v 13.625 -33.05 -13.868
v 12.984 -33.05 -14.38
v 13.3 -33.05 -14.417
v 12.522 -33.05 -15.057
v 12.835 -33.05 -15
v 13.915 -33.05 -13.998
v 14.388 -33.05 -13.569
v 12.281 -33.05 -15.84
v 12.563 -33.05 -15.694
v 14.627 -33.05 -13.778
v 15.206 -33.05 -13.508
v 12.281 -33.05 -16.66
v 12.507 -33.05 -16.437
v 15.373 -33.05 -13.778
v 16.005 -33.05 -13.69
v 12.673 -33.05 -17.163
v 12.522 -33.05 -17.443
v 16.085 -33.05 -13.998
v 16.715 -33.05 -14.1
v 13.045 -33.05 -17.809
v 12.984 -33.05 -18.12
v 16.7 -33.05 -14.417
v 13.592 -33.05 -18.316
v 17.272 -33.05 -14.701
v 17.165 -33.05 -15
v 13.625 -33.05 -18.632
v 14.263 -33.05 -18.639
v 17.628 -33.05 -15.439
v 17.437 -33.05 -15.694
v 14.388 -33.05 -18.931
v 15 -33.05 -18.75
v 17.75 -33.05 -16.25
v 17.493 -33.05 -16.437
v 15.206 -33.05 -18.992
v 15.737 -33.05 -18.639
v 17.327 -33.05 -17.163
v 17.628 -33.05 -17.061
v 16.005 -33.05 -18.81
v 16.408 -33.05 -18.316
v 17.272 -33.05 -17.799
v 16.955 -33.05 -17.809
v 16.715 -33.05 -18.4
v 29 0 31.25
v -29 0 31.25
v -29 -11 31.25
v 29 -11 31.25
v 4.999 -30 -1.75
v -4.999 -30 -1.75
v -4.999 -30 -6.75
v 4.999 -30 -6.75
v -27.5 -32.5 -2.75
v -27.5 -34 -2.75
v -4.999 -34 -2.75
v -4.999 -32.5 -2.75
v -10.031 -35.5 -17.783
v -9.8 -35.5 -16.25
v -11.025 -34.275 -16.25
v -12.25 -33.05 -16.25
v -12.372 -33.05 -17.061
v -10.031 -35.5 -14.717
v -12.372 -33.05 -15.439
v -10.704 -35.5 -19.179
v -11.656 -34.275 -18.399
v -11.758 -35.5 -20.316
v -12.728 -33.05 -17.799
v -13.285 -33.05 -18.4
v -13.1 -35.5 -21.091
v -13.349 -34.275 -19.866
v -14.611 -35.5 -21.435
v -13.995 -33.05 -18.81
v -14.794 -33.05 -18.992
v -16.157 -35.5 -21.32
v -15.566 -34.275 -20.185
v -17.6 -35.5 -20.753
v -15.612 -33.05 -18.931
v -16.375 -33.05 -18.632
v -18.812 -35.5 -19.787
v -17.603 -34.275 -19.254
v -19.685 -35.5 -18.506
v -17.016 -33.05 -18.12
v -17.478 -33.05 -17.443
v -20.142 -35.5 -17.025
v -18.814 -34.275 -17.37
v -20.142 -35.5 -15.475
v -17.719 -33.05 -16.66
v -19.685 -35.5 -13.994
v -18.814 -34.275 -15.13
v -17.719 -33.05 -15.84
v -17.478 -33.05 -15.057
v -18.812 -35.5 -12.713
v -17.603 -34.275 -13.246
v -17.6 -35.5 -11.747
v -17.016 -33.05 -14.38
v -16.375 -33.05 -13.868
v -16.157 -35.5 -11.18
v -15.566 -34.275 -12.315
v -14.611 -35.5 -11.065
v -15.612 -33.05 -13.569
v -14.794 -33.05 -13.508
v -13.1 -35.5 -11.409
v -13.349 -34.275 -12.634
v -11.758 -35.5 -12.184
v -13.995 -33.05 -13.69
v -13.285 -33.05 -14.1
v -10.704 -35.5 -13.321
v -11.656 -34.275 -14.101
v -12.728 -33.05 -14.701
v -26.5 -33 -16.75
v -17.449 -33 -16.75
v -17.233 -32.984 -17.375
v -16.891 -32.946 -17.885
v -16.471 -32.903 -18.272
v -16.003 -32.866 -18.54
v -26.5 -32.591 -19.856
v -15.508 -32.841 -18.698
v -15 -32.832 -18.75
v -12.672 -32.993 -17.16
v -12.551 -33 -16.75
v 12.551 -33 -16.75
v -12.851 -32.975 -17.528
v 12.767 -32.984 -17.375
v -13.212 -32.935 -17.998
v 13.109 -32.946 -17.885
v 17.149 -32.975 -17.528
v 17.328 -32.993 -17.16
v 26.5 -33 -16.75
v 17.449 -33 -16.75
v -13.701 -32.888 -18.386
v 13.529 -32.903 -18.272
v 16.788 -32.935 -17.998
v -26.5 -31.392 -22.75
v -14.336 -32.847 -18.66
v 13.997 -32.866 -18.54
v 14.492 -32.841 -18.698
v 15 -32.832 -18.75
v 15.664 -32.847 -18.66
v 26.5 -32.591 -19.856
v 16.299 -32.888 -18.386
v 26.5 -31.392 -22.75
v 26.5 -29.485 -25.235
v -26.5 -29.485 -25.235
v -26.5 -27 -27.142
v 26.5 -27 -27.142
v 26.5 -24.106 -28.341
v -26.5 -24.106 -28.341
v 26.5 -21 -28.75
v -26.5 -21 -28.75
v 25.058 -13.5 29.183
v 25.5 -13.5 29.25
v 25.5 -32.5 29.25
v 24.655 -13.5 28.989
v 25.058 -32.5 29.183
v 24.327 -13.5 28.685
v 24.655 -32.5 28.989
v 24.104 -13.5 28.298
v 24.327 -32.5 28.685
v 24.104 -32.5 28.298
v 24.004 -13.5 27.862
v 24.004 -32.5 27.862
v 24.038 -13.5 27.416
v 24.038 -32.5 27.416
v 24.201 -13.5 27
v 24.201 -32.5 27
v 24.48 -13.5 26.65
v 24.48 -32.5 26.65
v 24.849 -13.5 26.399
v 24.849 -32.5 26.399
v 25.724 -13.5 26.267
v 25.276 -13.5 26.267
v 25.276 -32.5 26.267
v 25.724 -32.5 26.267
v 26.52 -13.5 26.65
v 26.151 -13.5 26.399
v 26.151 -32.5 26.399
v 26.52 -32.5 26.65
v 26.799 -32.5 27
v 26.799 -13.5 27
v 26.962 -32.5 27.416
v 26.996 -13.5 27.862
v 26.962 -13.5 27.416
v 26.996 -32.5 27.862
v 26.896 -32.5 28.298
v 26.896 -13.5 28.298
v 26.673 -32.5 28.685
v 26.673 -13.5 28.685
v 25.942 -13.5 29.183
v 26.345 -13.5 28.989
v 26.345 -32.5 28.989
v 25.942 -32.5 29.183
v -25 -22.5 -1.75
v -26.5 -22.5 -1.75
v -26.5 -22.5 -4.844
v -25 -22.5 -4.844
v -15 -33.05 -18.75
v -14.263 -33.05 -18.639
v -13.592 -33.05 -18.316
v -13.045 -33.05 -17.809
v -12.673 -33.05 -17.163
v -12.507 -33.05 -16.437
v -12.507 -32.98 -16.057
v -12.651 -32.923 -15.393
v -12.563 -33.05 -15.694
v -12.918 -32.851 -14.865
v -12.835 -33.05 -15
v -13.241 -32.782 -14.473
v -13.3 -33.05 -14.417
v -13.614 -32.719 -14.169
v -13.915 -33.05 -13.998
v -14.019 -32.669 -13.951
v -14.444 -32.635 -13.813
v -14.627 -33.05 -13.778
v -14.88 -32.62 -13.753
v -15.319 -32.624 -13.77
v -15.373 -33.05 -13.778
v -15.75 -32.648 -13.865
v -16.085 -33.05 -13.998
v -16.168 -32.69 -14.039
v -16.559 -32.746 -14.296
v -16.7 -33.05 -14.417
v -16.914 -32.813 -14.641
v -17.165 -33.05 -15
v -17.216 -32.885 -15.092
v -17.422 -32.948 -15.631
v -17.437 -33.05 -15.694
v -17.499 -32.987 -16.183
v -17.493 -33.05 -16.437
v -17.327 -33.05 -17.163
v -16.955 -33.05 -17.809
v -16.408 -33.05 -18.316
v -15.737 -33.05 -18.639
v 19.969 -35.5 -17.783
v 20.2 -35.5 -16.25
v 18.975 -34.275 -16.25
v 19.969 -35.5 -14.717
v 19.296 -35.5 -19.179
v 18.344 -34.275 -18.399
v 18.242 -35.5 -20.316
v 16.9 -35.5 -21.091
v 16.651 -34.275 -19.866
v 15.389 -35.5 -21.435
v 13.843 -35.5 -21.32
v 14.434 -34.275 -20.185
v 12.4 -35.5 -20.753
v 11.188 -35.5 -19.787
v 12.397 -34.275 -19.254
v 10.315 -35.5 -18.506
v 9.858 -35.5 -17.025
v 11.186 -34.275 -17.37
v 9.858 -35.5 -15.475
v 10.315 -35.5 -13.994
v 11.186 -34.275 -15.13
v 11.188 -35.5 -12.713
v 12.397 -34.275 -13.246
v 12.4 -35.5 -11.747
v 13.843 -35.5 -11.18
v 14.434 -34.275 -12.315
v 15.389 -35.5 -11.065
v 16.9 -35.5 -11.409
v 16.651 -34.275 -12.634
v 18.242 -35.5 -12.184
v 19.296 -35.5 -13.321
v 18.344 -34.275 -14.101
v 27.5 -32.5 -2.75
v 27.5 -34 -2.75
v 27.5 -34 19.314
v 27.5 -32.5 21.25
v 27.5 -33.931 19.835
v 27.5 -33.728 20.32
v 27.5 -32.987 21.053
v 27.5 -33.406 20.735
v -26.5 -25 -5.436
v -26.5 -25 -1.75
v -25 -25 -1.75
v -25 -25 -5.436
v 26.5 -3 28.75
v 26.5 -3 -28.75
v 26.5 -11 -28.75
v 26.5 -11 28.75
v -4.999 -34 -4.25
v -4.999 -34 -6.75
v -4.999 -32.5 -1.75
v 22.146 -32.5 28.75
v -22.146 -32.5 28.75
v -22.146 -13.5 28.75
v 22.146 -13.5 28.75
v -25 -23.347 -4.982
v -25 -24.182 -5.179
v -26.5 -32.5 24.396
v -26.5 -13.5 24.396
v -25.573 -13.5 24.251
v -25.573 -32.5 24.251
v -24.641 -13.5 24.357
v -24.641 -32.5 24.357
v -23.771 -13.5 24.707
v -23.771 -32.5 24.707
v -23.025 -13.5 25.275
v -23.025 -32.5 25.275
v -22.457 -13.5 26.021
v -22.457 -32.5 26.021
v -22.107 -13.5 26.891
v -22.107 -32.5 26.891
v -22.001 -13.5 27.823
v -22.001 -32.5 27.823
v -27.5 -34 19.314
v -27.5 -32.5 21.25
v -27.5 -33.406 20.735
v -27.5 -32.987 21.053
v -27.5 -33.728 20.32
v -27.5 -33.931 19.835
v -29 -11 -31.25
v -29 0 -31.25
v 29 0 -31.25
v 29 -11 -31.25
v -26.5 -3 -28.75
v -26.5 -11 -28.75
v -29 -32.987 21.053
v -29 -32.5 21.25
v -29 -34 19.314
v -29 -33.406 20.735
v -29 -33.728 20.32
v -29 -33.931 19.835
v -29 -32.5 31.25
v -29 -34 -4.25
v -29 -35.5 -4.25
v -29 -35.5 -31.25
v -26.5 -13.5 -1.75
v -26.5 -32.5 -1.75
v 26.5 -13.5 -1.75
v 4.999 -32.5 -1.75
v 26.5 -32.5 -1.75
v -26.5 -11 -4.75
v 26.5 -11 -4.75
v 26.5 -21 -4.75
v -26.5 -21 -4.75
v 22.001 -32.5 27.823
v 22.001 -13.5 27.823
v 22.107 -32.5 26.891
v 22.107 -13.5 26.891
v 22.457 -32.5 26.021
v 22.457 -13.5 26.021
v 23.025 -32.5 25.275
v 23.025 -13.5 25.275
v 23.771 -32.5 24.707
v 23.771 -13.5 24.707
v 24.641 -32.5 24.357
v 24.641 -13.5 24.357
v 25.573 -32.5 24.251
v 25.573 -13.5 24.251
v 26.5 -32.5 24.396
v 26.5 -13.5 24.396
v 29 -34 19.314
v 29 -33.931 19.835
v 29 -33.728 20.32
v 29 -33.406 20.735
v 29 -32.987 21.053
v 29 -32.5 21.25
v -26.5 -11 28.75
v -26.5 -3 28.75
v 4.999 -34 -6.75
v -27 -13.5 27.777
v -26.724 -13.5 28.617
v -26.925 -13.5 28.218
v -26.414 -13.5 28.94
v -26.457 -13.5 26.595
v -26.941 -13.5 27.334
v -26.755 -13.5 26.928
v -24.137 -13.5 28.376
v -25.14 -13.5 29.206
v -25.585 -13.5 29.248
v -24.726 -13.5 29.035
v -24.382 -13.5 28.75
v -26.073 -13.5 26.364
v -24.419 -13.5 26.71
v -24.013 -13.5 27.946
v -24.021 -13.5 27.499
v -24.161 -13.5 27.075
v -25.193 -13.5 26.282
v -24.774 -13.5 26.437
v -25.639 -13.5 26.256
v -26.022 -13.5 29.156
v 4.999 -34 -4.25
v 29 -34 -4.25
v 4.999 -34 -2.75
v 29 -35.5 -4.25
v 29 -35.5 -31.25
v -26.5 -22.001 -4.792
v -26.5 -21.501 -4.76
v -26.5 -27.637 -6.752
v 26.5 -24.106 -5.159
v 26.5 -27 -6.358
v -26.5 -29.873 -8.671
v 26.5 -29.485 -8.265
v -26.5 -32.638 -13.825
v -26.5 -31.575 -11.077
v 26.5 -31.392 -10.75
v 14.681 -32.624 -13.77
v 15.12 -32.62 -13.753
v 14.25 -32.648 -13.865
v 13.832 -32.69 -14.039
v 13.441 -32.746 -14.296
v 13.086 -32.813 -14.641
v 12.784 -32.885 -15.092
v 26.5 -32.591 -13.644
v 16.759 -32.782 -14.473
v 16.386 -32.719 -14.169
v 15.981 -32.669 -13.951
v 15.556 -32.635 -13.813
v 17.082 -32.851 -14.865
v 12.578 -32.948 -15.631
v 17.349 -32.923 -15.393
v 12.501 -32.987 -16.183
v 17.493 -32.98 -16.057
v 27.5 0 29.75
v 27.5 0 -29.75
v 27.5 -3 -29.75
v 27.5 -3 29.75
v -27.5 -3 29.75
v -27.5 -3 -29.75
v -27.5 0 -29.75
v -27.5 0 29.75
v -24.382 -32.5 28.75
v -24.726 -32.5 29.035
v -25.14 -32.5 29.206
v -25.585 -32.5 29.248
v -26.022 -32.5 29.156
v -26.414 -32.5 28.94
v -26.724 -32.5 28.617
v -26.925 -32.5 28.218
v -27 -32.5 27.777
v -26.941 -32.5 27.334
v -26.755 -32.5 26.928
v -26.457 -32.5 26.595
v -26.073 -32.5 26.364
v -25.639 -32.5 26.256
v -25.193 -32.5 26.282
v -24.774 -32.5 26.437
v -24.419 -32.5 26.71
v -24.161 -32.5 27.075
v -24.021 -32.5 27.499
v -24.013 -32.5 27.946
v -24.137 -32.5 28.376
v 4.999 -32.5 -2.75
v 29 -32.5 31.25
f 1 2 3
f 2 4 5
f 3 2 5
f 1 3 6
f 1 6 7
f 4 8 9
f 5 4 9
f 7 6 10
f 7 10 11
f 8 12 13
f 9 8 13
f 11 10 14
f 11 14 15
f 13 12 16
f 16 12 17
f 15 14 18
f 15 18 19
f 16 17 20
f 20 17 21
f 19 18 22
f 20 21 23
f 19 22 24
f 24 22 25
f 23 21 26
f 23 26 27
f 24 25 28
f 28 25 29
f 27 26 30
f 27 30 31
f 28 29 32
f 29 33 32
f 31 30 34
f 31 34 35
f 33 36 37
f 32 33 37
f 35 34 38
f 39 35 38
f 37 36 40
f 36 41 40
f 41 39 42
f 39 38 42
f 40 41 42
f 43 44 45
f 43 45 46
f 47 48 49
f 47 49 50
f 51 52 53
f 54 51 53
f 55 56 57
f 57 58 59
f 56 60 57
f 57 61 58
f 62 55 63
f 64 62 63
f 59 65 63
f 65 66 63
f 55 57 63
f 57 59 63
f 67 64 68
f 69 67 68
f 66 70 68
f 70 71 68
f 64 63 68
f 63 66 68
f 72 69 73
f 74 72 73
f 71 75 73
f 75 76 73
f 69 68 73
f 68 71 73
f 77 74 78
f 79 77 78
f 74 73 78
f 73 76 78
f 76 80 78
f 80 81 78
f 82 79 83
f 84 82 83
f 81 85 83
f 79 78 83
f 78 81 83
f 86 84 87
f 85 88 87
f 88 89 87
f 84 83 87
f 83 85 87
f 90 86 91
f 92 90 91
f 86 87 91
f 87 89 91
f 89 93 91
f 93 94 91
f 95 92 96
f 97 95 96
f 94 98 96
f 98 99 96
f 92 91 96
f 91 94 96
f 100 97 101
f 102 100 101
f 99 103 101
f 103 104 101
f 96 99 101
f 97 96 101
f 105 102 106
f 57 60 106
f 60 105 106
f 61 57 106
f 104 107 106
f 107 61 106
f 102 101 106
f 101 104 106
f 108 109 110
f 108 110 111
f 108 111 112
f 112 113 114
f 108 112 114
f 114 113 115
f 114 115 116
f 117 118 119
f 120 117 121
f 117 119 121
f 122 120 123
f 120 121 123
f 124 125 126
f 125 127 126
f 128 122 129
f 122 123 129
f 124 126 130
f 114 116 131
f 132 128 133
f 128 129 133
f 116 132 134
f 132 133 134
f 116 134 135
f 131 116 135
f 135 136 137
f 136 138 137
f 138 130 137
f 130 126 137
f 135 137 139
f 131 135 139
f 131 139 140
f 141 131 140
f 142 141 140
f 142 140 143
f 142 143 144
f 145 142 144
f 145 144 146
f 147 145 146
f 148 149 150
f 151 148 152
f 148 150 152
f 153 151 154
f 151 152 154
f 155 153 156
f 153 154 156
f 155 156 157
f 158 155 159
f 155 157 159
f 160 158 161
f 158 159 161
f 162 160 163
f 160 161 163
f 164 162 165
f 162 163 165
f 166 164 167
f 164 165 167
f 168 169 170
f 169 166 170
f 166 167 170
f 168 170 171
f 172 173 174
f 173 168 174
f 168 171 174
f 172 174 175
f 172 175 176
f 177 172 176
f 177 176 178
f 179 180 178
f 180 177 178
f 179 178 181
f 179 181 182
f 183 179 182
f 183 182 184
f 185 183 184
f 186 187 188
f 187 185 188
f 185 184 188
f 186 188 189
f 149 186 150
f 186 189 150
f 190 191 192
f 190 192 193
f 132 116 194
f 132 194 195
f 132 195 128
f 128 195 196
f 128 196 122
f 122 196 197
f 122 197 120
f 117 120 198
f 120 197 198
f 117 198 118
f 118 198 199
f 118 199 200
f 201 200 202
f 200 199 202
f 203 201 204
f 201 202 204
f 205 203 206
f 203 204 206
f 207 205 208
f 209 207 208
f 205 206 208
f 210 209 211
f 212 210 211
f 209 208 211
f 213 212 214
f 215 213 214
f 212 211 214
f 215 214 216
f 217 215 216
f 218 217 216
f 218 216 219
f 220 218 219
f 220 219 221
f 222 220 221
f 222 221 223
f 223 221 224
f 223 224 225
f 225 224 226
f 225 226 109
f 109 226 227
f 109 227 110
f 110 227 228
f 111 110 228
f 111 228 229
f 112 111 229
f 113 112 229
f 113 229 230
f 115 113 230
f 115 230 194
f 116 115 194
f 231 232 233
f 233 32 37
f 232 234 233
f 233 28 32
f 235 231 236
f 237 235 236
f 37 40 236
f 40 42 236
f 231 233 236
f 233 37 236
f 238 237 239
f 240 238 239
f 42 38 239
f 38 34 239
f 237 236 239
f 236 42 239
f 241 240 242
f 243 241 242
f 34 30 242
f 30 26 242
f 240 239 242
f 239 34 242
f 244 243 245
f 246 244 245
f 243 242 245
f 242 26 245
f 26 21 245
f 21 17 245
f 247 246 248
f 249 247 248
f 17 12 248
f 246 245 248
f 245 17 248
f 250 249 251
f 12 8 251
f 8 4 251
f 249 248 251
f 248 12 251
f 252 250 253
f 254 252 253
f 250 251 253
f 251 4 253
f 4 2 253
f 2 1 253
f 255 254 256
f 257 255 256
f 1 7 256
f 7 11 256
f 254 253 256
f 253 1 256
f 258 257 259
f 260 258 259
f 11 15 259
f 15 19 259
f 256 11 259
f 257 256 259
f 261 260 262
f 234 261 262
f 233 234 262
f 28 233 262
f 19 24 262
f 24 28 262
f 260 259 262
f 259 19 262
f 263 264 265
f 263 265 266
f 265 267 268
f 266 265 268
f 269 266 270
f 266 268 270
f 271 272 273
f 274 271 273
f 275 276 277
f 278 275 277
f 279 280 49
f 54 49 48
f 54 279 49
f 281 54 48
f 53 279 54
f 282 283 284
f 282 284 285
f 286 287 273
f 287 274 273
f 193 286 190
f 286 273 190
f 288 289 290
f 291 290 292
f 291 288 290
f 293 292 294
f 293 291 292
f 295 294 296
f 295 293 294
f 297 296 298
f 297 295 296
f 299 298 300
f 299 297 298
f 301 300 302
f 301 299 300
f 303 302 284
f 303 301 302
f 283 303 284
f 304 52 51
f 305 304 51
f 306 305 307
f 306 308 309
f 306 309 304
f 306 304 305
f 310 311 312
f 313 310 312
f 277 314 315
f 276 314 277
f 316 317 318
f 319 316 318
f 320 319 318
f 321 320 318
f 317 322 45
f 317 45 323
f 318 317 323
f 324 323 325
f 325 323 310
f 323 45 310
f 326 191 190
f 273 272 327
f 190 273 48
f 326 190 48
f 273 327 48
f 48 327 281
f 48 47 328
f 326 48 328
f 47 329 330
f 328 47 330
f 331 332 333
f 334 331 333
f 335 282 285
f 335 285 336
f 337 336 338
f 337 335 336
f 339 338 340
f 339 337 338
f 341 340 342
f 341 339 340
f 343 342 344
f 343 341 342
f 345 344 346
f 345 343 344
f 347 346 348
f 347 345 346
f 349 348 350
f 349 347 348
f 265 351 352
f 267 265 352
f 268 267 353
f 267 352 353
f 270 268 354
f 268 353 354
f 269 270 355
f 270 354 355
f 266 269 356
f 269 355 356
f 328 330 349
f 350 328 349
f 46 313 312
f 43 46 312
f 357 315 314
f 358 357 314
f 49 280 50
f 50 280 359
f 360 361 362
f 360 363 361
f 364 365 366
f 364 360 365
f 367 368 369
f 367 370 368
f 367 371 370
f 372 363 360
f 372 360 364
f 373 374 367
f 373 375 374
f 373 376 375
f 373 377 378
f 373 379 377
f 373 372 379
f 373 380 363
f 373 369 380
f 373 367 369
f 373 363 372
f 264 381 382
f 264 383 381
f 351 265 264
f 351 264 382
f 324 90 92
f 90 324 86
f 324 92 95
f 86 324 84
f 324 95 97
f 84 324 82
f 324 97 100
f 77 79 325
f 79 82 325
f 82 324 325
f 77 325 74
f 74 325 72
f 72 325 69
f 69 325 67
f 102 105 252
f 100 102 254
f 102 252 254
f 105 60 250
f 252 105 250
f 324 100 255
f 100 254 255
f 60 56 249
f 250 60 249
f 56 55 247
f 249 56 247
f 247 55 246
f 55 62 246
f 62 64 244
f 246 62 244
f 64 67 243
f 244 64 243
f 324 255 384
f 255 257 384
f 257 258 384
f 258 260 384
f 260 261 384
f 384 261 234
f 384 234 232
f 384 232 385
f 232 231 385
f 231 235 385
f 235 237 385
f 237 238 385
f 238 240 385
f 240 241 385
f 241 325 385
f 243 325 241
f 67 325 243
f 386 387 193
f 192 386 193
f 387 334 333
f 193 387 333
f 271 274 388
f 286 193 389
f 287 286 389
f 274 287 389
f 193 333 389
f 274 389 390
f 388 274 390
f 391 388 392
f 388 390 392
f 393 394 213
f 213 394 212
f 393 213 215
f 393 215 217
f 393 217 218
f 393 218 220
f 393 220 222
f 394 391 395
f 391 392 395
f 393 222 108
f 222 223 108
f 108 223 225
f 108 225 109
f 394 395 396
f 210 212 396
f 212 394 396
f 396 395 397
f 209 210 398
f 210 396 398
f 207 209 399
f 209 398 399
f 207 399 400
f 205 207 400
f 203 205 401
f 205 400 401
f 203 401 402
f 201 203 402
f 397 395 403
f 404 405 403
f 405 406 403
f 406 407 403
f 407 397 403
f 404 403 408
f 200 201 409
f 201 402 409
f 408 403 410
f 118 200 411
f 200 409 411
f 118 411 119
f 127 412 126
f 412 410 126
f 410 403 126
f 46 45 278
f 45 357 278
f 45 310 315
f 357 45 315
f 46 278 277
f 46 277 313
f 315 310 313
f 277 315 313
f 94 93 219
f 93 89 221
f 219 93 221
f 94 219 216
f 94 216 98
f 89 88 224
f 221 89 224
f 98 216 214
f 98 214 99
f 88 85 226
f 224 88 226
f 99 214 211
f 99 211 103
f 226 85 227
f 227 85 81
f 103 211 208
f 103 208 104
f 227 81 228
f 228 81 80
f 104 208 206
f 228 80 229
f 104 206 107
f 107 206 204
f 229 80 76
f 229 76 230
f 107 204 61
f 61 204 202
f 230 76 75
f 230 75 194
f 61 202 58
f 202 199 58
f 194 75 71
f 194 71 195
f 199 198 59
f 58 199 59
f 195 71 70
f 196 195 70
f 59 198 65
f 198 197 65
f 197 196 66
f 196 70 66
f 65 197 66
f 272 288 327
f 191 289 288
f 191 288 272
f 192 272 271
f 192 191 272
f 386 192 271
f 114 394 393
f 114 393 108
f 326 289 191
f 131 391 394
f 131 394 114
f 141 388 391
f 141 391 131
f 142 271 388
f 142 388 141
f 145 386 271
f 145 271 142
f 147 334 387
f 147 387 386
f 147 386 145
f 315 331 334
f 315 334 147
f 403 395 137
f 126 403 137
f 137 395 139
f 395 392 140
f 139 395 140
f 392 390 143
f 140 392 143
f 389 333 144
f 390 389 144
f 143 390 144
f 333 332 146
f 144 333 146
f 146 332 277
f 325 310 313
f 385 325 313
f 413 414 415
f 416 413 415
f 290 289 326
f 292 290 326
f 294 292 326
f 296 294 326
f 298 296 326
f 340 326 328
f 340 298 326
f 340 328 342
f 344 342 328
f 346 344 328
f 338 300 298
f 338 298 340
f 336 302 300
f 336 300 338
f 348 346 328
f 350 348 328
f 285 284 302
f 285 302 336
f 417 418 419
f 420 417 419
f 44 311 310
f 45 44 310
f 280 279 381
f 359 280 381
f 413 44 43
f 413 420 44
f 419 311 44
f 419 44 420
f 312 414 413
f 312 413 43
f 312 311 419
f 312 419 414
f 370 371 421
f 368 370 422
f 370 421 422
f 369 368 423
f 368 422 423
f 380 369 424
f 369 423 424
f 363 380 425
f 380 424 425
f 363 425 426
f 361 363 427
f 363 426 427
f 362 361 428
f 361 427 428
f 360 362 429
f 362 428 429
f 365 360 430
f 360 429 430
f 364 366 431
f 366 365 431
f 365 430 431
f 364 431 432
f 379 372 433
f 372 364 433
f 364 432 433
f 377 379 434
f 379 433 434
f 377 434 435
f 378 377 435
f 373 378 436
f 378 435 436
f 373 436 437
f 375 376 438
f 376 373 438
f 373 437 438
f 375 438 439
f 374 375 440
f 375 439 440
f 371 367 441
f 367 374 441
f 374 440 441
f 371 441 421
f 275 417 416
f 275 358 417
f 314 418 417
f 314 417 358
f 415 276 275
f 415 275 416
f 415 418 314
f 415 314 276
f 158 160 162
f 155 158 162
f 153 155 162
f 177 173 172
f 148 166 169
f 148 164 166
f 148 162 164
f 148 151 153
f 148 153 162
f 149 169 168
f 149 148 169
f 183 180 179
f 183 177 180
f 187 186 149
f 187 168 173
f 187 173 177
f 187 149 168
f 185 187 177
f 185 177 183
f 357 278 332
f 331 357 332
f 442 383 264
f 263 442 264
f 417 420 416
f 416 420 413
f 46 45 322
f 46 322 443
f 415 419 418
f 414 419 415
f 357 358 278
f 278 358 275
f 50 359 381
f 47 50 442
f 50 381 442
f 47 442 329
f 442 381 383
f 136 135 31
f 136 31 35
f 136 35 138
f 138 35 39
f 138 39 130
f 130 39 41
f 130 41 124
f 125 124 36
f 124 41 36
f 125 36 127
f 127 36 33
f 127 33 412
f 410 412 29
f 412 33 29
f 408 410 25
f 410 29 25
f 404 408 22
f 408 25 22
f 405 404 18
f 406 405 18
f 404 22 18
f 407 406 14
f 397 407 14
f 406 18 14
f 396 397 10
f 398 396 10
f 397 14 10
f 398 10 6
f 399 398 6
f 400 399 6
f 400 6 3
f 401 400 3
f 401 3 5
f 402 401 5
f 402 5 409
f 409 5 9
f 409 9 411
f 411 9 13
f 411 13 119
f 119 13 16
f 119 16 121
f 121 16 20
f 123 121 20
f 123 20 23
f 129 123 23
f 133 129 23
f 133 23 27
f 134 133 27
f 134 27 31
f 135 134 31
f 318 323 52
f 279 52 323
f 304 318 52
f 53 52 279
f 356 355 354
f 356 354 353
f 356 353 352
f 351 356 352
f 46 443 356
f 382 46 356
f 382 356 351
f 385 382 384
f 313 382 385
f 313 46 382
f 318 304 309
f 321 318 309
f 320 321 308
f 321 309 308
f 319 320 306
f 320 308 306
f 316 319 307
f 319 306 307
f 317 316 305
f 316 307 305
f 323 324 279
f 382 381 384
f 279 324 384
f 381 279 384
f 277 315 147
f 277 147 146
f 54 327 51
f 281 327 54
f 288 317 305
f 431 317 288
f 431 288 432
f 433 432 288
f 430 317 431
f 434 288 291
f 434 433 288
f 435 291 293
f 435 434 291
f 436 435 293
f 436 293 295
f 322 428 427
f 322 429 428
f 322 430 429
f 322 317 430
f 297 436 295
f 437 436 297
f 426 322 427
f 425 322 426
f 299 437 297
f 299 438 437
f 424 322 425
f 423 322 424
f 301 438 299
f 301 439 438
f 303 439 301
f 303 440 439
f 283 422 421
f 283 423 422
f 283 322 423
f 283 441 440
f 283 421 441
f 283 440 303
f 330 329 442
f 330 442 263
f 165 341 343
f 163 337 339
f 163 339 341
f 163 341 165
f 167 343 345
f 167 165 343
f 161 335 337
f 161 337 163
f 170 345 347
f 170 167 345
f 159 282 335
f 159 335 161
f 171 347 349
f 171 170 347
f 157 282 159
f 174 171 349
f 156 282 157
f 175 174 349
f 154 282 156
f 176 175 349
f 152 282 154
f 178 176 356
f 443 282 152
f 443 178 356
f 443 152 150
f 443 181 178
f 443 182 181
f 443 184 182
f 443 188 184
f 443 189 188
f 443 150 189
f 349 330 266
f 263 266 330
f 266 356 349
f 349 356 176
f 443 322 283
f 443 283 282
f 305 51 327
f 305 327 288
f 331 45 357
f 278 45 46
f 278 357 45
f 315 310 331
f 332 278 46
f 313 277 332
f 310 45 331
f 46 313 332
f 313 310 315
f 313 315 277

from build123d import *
from build123d.topology import SkipClean

# Parameters (mm, degrees)
SKETCH1_W                 = 58
SKETCH1_H                 = 62.5
BOSS_EXTRUDE1_DEPTH       = 35.5
SKETCH2_W                 = 55
SKETCH2_H                 = 59.5
CUT_EXTRUDE1_DEPTH        = 3
SKETCH3_W                 = 53
SKETCH3_H                 = 57.5
CUT_EXTRUDE2_DEPTH        = 8
SKETCH4_W                 = 53
SKETCH4_H                 = 24.5
CUT_EXTRUDE3_DEPTH        = 22
SKETCH5_W                 = 53
SKETCH5_H                 = 30.5
CUT_EXTRUDE4_DEPTH        = 22
BOSS_EXTRUDE2_REACH       = 57.478
SKETCH6_R                 = 3.5
SKETCH6_R_2               = 1.5
SKETCH6_2_R               = 1.5
CUT_EXTRUDE5_DEPTH        = 22
BOSS_EXTRUDE4_DEPTH       = 53
SKETCH8_W                 = 58
SKETCH8_H                 = 35.5
CUT_EXTRUDE6_DEPTH        = 1.5
SKETCH10_W                = 9.998360964
SKETCH10_H                = 5
CUT_EXTRUDE8_DEPTH        = 4
CUT_EXTRUDE7_REACH        = 58.482
CUT_EXTRUDE7_END_RADIUS   = 12
SKETCH9_W                 = 1.5
SKETCH9_H                 = 2.5
SKETCH11_W                = 55
SKETCH11_H                = 32.5
CUT_EXTRUDE9_DEPTH        = 1.5
SKETCH12_W                = 58
SKETCH12_H                = 10
CUT_EXTRUDE10_DEPTH       = 1.5
FILLET2_R                 = 2
ADVANCEDHOLE1_OUTLINE_R   = 2.75
ADVANCEDHOLE1_DEPTH       = 2.45
ADVANCEDHOLE1_DRAFT       = 45
ADVANCEDHOLE1_2_OUTLINE_R = 2.75
ADVANCEDHOLE1_2_DEPTH     = 2.45
ADVANCEDHOLE1_2_DRAFT     = 45
SKETCH13_R                = 2.5
CUT_EXTRUDE11_DEPTH       = 56.478036195
SPLIT1_START              = -31.25
SPLIT1_OUTLINE_W          = 58
SPLIT1_OUTLINE_H          = 11
SPLIT1_DEPTH              = 62.5
SPLIT1_2_DEPTH            = 62.5
SPLIT1_3_OUTLINE_W        = 53
SPLIT1_3_OUTLINE_H        = 8
SPLIT1_3_DEPTH            = 2.5
SPLIT1_START_2            = 28.75
SPLIT1_4_OUTLINE_W        = 53
SPLIT1_4_OUTLINE_H        = 8
SPLIT1_4_DEPTH            = 2.5
SPLIT1_5_OUTLINE_W        = 55
SPLIT1_5_OUTLINE_H        = 3
SPLIT1_5_DEPTH            = 1.5
SPLIT1_START_3            = 29.75
SPLIT1_6_OUTLINE_W        = 55
SPLIT1_6_OUTLINE_H        = 3
SPLIT1_6_DEPTH            = 1.5


# Read off the part's stored shape, not the designer's step: AdvancedHole1, Split1
with BuildPart() as part:
    # Sketch1 → Boss-Extrude1 (new body)
    with BuildSketch(Plane(origin=(0, 0, 0), x_dir=(1, 0, 0), z_dir=(0, 1, 0))):
        Rectangle(SKETCH1_W, SKETCH1_H)
    extrude(amount=-BOSS_EXTRUDE1_DEPTH)

    # Sketch2 → Cut-Extrude1 (cut)
    with BuildSketch(Plane(origin=(0, 0, 0), x_dir=(1, 0, 0), z_dir=(0, 1, 0))):
        Rectangle(SKETCH2_W, SKETCH2_H)
    extrude(amount=-CUT_EXTRUDE1_DEPTH, mode=Mode.SUBTRACT)

    # Sketch3 → Cut-Extrude2 (cut)
    with BuildSketch(Plane(origin=(0, -3, 0), x_dir=(1, 0, 0), z_dir=(0, 1, 0))):
        Rectangle(SKETCH3_W, SKETCH3_H)
    extrude(amount=-CUT_EXTRUDE2_DEPTH, mode=Mode.SUBTRACT)

    # Sketch4 → Cut-Extrude3 (cut)
    with BuildSketch(Plane(origin=(0, -11, 0), x_dir=(1, 0, 0), z_dir=(0, 1, 0))):
        with Locations((0, 16.5)):
            Rectangle(SKETCH4_W, SKETCH4_H)
    extrude(amount=-CUT_EXTRUDE3_DEPTH, mode=Mode.SUBTRACT)

    # Sketch5 → Cut-Extrude4 (cut)
    with BuildSketch(Plane.XZ.offset(35.5)):
        with Locations((0, 13.5)):
            Rectangle(SKETCH5_W, SKETCH5_H)
    extrude(amount=-CUT_EXTRUDE4_DEPTH, mode=Mode.SUBTRACT)

    # Sketch6 → Boss-Extrude2 (add, up to next)
    with BuildSketch(Plane.XZ.offset(35.5), mode=Mode.PRIVATE) as boss_extrude2_sk1:
        with Locations((-25.5, 27.75)):
            Circle(SKETCH6_R)
        with Locations((-25.5, 27.75)):
            Circle(SKETCH6_R_2, mode=Mode.SUBTRACT)
    boss_extrude2_tool1 = extrude(boss_extrude2_sk1.sketch, amount=-BOSS_EXTRUDE2_REACH, mode=Mode.PRIVATE) - part.part
    # Sketch6 → Boss-Extrude2 (add, up to next)
    with BuildSketch(Plane.XZ.offset(35.5), mode=Mode.PRIVATE) as boss_extrude2_sk2:
        with Locations((25.5, 27.75)):
            Circle(SKETCH6_R)
        with Locations((25.5, 27.75)):
            Circle(SKETCH6_R_2, mode=Mode.SUBTRACT)
    boss_extrude2_tool2 = extrude(boss_extrude2_sk2.sketch, amount=-BOSS_EXTRUDE2_REACH, mode=Mode.PRIVATE) - part.part
    add(boss_extrude2_tool1.solids().sort_by_distance((-28.901005, -35.5, 27.75))[0])
    add(boss_extrude2_tool2.solids().sort_by_distance((22.098995, -35.5, 27.75))[0])

    # Sketch6<2> → Cut-Extrude5 (cut)
    with BuildSketch(Plane.XZ.offset(35.5)):
        with Locations(Location((-25.5, 27.75, 0), (0, 0, 270))):
            Circle(SKETCH6_2_R)
        with Locations(Location((25.5, 27.75, 0), (0, 0, 90))):
            Circle(SKETCH6_2_R)
    extrude(amount=-CUT_EXTRUDE5_DEPTH, mode=Mode.SUBTRACT)

    # Sketch7 → Boss-Extrude4 (add)
    with BuildSketch(Plane.ZY.offset(-26.5)):
        with BuildLine():
            Line((-16.75, -33), (-4.25, -33))
            Line((-4.25, -33), (-4.25, -11))
            Line((-4.25, -11), (-4.75, -11))
            Line((-4.75, -11), (-4.75, -21))
            ThreePointArc((-4.75, -21), (-8.264718626, -29.485281374), (-16.75, -33))
        make_face()
        with BuildLine():
            Line((-28.75, -33), (-16.75, -33))
            ThreePointArc((-16.75, -33), (-25.235281374, -29.485281374), (-28.75, -21))
            Line((-28.75, -21), (-28.75, -33))
        make_face()
    extrude(amount=BOSS_EXTRUDE4_DEPTH)

    # Sketch8 → Cut-Extrude6 (cut)
    with BuildSketch(Plane.XZ.offset(35.5)):
        with Locations((0, 13.5)):
            Rectangle(SKETCH8_W, SKETCH8_H)
    extrude(amount=-CUT_EXTRUDE6_DEPTH, mode=Mode.SUBTRACT)

    # Sketch10 → Cut-Extrude8 (cut)
    with BuildSketch(Plane.XZ.offset(34)):
        with Locations((0, -4.25)):
            Rectangle(SKETCH10_W, SKETCH10_H)
    extrude(amount=-CUT_EXTRUDE8_DEPTH, mode=Mode.SUBTRACT)

    # Cut-Extrude7: up to this cylinder (the profile starts outside it)
    cut_extrude7_end = Plane(origin=(-25.75, -21, -16.75), z_dir=(1, 0, 0)) * Cylinder(CUT_EXTRUDE7_END_RADIUS, 141.964, mode=Mode.PRIVATE)
    # Sketch9 → Cut-Extrude7 (cut, up to the surface)
    with BuildSketch(Plane.XY.offset(-1.75), mode=Mode.PRIVATE) as cut_extrude7_sk1:
        with Locations((-25.75, -23.75)):
            Rectangle(SKETCH9_W, SKETCH9_H)
    cut_extrude7_tool1 = extrude(cut_extrude7_sk1.sketch, amount=-CUT_EXTRUDE7_REACH, mode=Mode.PRIVATE) - cut_extrude7_end
    add(cut_extrude7_tool1.solids().sort_by_distance((-25.75, -23.75, -1.75))[0], mode=Mode.SUBTRACT)

    # Sketch11 → Cut-Extrude9 (cut)
    with BuildSketch(Plane.XZ.offset(34)):
        with Locations((0, 13.5)):
            Rectangle(SKETCH11_W, SKETCH11_H)
    extrude(amount=-CUT_EXTRUDE9_DEPTH, mode=Mode.SUBTRACT)

    # Sketch12 → Cut-Extrude10 (cut)
    with BuildSketch(Plane.XZ.offset(34)):
        with Locations((0, 26.25)):
            Rectangle(SKETCH12_W, SKETCH12_H)
    extrude(amount=-CUT_EXTRUDE10_DEPTH, mode=Mode.SUBTRACT)

    # Fillet2
    # the kernel refuses this fillet: 2 mm, written as the material it takes off along each edge
    with BuildSketch(Plane(origin=(-22.658770817, -34, 21.25), x_dir=(0, 0, -1), z_dir=(-1, 0, 0))) as fillet2_piece_1:
        with BuildLine():
            CenterArc((1.936491673, -2), FILLET2_R, 90, 75.522487814)
            Line((0, -1.5), (-0.038729833, -1.49))
            ThreePointArc((-0.038729833, -1.49), (-0.04, -0.75), (-0.04, 0))
            Line((-0.04, 0), (0, 0.04))
            Line((0, 0.04), (1.936491673, 0.04))
            Line((1.936491673, 0.04), (1.936491673, 0))
        make_face()
    extrude(amount=11.182458366, mode=Mode.SUBTRACT)
    with BuildSketch(Plane(origin=(33.841229183, -34, 21.25), x_dir=(0, 1, 0), z_dir=(-1, 0, 0))) as fillet2_piece_2:
        with BuildLine():
            CenterArc((2, 1.936491673), FILLET2_R, 180, 75.522487814)
            Line((0, 1.936491673), (-0.04, 1.936491673))
            Line((-0.04, 1.936491673), (-0.04, 0))
            Line((-0.04, 0), (0, -0.04))
            ThreePointArc((0, -0.04), (0.75, -0.04), (1.49, -0.038729833))
            Line((1.49, -0.038729833), (1.5, 0))
        make_face()
    extrude(amount=11.182458366, mode=Mode.SUBTRACT)


with BuildPart() as advancedhole1_tool:
    # AdvancedHole1 outline → AdvancedHole1 (with draft: the straight prism first)
    with BuildSketch(Plane(origin=(0, -33.05, 0), x_dir=(1, 0, 0), z_dir=(0, 1, 0))):
        with Locations((15, 16.25)):
            Circle(ADVANCEDHOLE1_OUTLINE_R)
    extrude(amount=-ADVANCEDHOLE1_DEPTH)
    # AdvancedHole1: the draft: its side faces are tilted about the plane it starts from
    advancedhole1_sides = [advancedhole1_tool.faces().sort_by_distance(p)[0] for p in [
        (12.25, -34.275, -16.25),
    ]]
    draft(advancedhole1_sides, Plane(origin=(0, -33.05, 0), x_dir=(1, 0, 0), z_dir=(0, 1, 0)), ADVANCEDHOLE1_DRAFT)


with BuildPart() as part_1:
    add(part.part)

    # AdvancedHole1: cut by advancedhole1_tool
    add(advancedhole1_tool.part, mode=Mode.SUBTRACT)


with BuildPart() as advancedhole1_2_tool:
    # AdvancedHole1 2 outline → AdvancedHole1 2 (with draft: the straight prism first)
    with BuildSketch(Plane(origin=(0, -33.05, 0), x_dir=(1, 0, 0), z_dir=(0, 1, 0))):
        with Locations((-15, 16.25)):
            Circle(ADVANCEDHOLE1_2_OUTLINE_R)
    extrude(amount=-ADVANCEDHOLE1_2_DEPTH)
    # AdvancedHole1 2: the draft: its side faces are tilted about the plane it starts from
    advancedhole1_2_sides = [advancedhole1_2_tool.faces().sort_by_distance(p)[0] for p in [
        (-17.75, -34.275, -16.25),
    ]]
    draft(advancedhole1_2_sides, Plane(origin=(0, -33.05, 0), x_dir=(1, 0, 0), z_dir=(0, 1, 0)), ADVANCEDHOLE1_2_DRAFT)


with BuildPart() as part_2:
    add(part_1.part)

    # AdvancedHole1 2: cut by advancedhole1_2_tool
    add(advancedhole1_2_tool.part, mode=Mode.SUBTRACT)

    # Sketch13 → Cut-Extrude11 (cut, through all)
    with SkipClean():  # the faces are left unmerged after this step: merging them gives an invalid solid
        with BuildSketch(Plane.XZ.offset(35.5)):
            with Locations(Location((15, -16.25, 0), (0, 0, 270))):
                Circle(SKETCH13_R)
            with Locations(Location((-15, -16.25, 0), (0, 0, 270))):
                Circle(SKETCH13_R)
        extrude(amount=-CUT_EXTRUDE11_DEPTH, mode=Mode.SUBTRACT)

    # Split1 outline → Split1 (cut)
    with SkipClean():  # the faces are left unmerged after this step: merging them gives an invalid solid
        with BuildSketch(Plane.XY.offset(SPLIT1_START)):
            with Locations((0, -5.5)):
                Rectangle(SPLIT1_OUTLINE_W, SPLIT1_OUTLINE_H)
        extrude(amount=SPLIT1_DEPTH, mode=Mode.SUBTRACT)


with BuildPart() as body_2:
    # Split1 2 outline → Split1 2 (new body)
    with BuildSketch(Plane.XY.offset(SPLIT1_START)):
        Polygon((26.5, -11), (29, -11), (29, 0), (27.5, 0), (27.5, -3), (26.5, -3), align=None)
        Polygon((-29, -11), (-26.5, -11), (-26.5, -3), (-27.5, -3), (-27.5, 0), (-29, 0), align=None)
    extrude(amount=SPLIT1_2_DEPTH)

    # Split1 3 outline → Split1 3 (add)
    with BuildSketch(Plane.XY.offset(SPLIT1_START)):
        with Locations((0, -7)):
            Rectangle(SPLIT1_3_OUTLINE_W, SPLIT1_3_OUTLINE_H)
    extrude(amount=SPLIT1_3_DEPTH)

    # Split1 4 outline → Split1 4 (add)
    with BuildSketch(Plane.XY.offset(SPLIT1_START_2)):
        with Locations((0, -7)):
            Rectangle(SPLIT1_4_OUTLINE_W, SPLIT1_4_OUTLINE_H)
    extrude(amount=SPLIT1_4_DEPTH)

    # Split1 5 outline → Split1 5 (add)
    with BuildSketch(Plane.XY.offset(SPLIT1_START)):
        with Locations((0, -1.5)):
            Rectangle(SPLIT1_5_OUTLINE_W, SPLIT1_5_OUTLINE_H)
    extrude(amount=SPLIT1_5_DEPTH)

    # Split1 6 outline → Split1 6 (add)
    with BuildSketch(Plane.XY.offset(SPLIT1_START_3)):
        with Locations((0, -1.5)):
            Rectangle(SPLIT1_6_OUTLINE_W, SPLIT1_6_OUTLINE_H)
    extrude(amount=SPLIT1_6_DEPTH)


solid = Compound([part_2.part, body_2.part])
